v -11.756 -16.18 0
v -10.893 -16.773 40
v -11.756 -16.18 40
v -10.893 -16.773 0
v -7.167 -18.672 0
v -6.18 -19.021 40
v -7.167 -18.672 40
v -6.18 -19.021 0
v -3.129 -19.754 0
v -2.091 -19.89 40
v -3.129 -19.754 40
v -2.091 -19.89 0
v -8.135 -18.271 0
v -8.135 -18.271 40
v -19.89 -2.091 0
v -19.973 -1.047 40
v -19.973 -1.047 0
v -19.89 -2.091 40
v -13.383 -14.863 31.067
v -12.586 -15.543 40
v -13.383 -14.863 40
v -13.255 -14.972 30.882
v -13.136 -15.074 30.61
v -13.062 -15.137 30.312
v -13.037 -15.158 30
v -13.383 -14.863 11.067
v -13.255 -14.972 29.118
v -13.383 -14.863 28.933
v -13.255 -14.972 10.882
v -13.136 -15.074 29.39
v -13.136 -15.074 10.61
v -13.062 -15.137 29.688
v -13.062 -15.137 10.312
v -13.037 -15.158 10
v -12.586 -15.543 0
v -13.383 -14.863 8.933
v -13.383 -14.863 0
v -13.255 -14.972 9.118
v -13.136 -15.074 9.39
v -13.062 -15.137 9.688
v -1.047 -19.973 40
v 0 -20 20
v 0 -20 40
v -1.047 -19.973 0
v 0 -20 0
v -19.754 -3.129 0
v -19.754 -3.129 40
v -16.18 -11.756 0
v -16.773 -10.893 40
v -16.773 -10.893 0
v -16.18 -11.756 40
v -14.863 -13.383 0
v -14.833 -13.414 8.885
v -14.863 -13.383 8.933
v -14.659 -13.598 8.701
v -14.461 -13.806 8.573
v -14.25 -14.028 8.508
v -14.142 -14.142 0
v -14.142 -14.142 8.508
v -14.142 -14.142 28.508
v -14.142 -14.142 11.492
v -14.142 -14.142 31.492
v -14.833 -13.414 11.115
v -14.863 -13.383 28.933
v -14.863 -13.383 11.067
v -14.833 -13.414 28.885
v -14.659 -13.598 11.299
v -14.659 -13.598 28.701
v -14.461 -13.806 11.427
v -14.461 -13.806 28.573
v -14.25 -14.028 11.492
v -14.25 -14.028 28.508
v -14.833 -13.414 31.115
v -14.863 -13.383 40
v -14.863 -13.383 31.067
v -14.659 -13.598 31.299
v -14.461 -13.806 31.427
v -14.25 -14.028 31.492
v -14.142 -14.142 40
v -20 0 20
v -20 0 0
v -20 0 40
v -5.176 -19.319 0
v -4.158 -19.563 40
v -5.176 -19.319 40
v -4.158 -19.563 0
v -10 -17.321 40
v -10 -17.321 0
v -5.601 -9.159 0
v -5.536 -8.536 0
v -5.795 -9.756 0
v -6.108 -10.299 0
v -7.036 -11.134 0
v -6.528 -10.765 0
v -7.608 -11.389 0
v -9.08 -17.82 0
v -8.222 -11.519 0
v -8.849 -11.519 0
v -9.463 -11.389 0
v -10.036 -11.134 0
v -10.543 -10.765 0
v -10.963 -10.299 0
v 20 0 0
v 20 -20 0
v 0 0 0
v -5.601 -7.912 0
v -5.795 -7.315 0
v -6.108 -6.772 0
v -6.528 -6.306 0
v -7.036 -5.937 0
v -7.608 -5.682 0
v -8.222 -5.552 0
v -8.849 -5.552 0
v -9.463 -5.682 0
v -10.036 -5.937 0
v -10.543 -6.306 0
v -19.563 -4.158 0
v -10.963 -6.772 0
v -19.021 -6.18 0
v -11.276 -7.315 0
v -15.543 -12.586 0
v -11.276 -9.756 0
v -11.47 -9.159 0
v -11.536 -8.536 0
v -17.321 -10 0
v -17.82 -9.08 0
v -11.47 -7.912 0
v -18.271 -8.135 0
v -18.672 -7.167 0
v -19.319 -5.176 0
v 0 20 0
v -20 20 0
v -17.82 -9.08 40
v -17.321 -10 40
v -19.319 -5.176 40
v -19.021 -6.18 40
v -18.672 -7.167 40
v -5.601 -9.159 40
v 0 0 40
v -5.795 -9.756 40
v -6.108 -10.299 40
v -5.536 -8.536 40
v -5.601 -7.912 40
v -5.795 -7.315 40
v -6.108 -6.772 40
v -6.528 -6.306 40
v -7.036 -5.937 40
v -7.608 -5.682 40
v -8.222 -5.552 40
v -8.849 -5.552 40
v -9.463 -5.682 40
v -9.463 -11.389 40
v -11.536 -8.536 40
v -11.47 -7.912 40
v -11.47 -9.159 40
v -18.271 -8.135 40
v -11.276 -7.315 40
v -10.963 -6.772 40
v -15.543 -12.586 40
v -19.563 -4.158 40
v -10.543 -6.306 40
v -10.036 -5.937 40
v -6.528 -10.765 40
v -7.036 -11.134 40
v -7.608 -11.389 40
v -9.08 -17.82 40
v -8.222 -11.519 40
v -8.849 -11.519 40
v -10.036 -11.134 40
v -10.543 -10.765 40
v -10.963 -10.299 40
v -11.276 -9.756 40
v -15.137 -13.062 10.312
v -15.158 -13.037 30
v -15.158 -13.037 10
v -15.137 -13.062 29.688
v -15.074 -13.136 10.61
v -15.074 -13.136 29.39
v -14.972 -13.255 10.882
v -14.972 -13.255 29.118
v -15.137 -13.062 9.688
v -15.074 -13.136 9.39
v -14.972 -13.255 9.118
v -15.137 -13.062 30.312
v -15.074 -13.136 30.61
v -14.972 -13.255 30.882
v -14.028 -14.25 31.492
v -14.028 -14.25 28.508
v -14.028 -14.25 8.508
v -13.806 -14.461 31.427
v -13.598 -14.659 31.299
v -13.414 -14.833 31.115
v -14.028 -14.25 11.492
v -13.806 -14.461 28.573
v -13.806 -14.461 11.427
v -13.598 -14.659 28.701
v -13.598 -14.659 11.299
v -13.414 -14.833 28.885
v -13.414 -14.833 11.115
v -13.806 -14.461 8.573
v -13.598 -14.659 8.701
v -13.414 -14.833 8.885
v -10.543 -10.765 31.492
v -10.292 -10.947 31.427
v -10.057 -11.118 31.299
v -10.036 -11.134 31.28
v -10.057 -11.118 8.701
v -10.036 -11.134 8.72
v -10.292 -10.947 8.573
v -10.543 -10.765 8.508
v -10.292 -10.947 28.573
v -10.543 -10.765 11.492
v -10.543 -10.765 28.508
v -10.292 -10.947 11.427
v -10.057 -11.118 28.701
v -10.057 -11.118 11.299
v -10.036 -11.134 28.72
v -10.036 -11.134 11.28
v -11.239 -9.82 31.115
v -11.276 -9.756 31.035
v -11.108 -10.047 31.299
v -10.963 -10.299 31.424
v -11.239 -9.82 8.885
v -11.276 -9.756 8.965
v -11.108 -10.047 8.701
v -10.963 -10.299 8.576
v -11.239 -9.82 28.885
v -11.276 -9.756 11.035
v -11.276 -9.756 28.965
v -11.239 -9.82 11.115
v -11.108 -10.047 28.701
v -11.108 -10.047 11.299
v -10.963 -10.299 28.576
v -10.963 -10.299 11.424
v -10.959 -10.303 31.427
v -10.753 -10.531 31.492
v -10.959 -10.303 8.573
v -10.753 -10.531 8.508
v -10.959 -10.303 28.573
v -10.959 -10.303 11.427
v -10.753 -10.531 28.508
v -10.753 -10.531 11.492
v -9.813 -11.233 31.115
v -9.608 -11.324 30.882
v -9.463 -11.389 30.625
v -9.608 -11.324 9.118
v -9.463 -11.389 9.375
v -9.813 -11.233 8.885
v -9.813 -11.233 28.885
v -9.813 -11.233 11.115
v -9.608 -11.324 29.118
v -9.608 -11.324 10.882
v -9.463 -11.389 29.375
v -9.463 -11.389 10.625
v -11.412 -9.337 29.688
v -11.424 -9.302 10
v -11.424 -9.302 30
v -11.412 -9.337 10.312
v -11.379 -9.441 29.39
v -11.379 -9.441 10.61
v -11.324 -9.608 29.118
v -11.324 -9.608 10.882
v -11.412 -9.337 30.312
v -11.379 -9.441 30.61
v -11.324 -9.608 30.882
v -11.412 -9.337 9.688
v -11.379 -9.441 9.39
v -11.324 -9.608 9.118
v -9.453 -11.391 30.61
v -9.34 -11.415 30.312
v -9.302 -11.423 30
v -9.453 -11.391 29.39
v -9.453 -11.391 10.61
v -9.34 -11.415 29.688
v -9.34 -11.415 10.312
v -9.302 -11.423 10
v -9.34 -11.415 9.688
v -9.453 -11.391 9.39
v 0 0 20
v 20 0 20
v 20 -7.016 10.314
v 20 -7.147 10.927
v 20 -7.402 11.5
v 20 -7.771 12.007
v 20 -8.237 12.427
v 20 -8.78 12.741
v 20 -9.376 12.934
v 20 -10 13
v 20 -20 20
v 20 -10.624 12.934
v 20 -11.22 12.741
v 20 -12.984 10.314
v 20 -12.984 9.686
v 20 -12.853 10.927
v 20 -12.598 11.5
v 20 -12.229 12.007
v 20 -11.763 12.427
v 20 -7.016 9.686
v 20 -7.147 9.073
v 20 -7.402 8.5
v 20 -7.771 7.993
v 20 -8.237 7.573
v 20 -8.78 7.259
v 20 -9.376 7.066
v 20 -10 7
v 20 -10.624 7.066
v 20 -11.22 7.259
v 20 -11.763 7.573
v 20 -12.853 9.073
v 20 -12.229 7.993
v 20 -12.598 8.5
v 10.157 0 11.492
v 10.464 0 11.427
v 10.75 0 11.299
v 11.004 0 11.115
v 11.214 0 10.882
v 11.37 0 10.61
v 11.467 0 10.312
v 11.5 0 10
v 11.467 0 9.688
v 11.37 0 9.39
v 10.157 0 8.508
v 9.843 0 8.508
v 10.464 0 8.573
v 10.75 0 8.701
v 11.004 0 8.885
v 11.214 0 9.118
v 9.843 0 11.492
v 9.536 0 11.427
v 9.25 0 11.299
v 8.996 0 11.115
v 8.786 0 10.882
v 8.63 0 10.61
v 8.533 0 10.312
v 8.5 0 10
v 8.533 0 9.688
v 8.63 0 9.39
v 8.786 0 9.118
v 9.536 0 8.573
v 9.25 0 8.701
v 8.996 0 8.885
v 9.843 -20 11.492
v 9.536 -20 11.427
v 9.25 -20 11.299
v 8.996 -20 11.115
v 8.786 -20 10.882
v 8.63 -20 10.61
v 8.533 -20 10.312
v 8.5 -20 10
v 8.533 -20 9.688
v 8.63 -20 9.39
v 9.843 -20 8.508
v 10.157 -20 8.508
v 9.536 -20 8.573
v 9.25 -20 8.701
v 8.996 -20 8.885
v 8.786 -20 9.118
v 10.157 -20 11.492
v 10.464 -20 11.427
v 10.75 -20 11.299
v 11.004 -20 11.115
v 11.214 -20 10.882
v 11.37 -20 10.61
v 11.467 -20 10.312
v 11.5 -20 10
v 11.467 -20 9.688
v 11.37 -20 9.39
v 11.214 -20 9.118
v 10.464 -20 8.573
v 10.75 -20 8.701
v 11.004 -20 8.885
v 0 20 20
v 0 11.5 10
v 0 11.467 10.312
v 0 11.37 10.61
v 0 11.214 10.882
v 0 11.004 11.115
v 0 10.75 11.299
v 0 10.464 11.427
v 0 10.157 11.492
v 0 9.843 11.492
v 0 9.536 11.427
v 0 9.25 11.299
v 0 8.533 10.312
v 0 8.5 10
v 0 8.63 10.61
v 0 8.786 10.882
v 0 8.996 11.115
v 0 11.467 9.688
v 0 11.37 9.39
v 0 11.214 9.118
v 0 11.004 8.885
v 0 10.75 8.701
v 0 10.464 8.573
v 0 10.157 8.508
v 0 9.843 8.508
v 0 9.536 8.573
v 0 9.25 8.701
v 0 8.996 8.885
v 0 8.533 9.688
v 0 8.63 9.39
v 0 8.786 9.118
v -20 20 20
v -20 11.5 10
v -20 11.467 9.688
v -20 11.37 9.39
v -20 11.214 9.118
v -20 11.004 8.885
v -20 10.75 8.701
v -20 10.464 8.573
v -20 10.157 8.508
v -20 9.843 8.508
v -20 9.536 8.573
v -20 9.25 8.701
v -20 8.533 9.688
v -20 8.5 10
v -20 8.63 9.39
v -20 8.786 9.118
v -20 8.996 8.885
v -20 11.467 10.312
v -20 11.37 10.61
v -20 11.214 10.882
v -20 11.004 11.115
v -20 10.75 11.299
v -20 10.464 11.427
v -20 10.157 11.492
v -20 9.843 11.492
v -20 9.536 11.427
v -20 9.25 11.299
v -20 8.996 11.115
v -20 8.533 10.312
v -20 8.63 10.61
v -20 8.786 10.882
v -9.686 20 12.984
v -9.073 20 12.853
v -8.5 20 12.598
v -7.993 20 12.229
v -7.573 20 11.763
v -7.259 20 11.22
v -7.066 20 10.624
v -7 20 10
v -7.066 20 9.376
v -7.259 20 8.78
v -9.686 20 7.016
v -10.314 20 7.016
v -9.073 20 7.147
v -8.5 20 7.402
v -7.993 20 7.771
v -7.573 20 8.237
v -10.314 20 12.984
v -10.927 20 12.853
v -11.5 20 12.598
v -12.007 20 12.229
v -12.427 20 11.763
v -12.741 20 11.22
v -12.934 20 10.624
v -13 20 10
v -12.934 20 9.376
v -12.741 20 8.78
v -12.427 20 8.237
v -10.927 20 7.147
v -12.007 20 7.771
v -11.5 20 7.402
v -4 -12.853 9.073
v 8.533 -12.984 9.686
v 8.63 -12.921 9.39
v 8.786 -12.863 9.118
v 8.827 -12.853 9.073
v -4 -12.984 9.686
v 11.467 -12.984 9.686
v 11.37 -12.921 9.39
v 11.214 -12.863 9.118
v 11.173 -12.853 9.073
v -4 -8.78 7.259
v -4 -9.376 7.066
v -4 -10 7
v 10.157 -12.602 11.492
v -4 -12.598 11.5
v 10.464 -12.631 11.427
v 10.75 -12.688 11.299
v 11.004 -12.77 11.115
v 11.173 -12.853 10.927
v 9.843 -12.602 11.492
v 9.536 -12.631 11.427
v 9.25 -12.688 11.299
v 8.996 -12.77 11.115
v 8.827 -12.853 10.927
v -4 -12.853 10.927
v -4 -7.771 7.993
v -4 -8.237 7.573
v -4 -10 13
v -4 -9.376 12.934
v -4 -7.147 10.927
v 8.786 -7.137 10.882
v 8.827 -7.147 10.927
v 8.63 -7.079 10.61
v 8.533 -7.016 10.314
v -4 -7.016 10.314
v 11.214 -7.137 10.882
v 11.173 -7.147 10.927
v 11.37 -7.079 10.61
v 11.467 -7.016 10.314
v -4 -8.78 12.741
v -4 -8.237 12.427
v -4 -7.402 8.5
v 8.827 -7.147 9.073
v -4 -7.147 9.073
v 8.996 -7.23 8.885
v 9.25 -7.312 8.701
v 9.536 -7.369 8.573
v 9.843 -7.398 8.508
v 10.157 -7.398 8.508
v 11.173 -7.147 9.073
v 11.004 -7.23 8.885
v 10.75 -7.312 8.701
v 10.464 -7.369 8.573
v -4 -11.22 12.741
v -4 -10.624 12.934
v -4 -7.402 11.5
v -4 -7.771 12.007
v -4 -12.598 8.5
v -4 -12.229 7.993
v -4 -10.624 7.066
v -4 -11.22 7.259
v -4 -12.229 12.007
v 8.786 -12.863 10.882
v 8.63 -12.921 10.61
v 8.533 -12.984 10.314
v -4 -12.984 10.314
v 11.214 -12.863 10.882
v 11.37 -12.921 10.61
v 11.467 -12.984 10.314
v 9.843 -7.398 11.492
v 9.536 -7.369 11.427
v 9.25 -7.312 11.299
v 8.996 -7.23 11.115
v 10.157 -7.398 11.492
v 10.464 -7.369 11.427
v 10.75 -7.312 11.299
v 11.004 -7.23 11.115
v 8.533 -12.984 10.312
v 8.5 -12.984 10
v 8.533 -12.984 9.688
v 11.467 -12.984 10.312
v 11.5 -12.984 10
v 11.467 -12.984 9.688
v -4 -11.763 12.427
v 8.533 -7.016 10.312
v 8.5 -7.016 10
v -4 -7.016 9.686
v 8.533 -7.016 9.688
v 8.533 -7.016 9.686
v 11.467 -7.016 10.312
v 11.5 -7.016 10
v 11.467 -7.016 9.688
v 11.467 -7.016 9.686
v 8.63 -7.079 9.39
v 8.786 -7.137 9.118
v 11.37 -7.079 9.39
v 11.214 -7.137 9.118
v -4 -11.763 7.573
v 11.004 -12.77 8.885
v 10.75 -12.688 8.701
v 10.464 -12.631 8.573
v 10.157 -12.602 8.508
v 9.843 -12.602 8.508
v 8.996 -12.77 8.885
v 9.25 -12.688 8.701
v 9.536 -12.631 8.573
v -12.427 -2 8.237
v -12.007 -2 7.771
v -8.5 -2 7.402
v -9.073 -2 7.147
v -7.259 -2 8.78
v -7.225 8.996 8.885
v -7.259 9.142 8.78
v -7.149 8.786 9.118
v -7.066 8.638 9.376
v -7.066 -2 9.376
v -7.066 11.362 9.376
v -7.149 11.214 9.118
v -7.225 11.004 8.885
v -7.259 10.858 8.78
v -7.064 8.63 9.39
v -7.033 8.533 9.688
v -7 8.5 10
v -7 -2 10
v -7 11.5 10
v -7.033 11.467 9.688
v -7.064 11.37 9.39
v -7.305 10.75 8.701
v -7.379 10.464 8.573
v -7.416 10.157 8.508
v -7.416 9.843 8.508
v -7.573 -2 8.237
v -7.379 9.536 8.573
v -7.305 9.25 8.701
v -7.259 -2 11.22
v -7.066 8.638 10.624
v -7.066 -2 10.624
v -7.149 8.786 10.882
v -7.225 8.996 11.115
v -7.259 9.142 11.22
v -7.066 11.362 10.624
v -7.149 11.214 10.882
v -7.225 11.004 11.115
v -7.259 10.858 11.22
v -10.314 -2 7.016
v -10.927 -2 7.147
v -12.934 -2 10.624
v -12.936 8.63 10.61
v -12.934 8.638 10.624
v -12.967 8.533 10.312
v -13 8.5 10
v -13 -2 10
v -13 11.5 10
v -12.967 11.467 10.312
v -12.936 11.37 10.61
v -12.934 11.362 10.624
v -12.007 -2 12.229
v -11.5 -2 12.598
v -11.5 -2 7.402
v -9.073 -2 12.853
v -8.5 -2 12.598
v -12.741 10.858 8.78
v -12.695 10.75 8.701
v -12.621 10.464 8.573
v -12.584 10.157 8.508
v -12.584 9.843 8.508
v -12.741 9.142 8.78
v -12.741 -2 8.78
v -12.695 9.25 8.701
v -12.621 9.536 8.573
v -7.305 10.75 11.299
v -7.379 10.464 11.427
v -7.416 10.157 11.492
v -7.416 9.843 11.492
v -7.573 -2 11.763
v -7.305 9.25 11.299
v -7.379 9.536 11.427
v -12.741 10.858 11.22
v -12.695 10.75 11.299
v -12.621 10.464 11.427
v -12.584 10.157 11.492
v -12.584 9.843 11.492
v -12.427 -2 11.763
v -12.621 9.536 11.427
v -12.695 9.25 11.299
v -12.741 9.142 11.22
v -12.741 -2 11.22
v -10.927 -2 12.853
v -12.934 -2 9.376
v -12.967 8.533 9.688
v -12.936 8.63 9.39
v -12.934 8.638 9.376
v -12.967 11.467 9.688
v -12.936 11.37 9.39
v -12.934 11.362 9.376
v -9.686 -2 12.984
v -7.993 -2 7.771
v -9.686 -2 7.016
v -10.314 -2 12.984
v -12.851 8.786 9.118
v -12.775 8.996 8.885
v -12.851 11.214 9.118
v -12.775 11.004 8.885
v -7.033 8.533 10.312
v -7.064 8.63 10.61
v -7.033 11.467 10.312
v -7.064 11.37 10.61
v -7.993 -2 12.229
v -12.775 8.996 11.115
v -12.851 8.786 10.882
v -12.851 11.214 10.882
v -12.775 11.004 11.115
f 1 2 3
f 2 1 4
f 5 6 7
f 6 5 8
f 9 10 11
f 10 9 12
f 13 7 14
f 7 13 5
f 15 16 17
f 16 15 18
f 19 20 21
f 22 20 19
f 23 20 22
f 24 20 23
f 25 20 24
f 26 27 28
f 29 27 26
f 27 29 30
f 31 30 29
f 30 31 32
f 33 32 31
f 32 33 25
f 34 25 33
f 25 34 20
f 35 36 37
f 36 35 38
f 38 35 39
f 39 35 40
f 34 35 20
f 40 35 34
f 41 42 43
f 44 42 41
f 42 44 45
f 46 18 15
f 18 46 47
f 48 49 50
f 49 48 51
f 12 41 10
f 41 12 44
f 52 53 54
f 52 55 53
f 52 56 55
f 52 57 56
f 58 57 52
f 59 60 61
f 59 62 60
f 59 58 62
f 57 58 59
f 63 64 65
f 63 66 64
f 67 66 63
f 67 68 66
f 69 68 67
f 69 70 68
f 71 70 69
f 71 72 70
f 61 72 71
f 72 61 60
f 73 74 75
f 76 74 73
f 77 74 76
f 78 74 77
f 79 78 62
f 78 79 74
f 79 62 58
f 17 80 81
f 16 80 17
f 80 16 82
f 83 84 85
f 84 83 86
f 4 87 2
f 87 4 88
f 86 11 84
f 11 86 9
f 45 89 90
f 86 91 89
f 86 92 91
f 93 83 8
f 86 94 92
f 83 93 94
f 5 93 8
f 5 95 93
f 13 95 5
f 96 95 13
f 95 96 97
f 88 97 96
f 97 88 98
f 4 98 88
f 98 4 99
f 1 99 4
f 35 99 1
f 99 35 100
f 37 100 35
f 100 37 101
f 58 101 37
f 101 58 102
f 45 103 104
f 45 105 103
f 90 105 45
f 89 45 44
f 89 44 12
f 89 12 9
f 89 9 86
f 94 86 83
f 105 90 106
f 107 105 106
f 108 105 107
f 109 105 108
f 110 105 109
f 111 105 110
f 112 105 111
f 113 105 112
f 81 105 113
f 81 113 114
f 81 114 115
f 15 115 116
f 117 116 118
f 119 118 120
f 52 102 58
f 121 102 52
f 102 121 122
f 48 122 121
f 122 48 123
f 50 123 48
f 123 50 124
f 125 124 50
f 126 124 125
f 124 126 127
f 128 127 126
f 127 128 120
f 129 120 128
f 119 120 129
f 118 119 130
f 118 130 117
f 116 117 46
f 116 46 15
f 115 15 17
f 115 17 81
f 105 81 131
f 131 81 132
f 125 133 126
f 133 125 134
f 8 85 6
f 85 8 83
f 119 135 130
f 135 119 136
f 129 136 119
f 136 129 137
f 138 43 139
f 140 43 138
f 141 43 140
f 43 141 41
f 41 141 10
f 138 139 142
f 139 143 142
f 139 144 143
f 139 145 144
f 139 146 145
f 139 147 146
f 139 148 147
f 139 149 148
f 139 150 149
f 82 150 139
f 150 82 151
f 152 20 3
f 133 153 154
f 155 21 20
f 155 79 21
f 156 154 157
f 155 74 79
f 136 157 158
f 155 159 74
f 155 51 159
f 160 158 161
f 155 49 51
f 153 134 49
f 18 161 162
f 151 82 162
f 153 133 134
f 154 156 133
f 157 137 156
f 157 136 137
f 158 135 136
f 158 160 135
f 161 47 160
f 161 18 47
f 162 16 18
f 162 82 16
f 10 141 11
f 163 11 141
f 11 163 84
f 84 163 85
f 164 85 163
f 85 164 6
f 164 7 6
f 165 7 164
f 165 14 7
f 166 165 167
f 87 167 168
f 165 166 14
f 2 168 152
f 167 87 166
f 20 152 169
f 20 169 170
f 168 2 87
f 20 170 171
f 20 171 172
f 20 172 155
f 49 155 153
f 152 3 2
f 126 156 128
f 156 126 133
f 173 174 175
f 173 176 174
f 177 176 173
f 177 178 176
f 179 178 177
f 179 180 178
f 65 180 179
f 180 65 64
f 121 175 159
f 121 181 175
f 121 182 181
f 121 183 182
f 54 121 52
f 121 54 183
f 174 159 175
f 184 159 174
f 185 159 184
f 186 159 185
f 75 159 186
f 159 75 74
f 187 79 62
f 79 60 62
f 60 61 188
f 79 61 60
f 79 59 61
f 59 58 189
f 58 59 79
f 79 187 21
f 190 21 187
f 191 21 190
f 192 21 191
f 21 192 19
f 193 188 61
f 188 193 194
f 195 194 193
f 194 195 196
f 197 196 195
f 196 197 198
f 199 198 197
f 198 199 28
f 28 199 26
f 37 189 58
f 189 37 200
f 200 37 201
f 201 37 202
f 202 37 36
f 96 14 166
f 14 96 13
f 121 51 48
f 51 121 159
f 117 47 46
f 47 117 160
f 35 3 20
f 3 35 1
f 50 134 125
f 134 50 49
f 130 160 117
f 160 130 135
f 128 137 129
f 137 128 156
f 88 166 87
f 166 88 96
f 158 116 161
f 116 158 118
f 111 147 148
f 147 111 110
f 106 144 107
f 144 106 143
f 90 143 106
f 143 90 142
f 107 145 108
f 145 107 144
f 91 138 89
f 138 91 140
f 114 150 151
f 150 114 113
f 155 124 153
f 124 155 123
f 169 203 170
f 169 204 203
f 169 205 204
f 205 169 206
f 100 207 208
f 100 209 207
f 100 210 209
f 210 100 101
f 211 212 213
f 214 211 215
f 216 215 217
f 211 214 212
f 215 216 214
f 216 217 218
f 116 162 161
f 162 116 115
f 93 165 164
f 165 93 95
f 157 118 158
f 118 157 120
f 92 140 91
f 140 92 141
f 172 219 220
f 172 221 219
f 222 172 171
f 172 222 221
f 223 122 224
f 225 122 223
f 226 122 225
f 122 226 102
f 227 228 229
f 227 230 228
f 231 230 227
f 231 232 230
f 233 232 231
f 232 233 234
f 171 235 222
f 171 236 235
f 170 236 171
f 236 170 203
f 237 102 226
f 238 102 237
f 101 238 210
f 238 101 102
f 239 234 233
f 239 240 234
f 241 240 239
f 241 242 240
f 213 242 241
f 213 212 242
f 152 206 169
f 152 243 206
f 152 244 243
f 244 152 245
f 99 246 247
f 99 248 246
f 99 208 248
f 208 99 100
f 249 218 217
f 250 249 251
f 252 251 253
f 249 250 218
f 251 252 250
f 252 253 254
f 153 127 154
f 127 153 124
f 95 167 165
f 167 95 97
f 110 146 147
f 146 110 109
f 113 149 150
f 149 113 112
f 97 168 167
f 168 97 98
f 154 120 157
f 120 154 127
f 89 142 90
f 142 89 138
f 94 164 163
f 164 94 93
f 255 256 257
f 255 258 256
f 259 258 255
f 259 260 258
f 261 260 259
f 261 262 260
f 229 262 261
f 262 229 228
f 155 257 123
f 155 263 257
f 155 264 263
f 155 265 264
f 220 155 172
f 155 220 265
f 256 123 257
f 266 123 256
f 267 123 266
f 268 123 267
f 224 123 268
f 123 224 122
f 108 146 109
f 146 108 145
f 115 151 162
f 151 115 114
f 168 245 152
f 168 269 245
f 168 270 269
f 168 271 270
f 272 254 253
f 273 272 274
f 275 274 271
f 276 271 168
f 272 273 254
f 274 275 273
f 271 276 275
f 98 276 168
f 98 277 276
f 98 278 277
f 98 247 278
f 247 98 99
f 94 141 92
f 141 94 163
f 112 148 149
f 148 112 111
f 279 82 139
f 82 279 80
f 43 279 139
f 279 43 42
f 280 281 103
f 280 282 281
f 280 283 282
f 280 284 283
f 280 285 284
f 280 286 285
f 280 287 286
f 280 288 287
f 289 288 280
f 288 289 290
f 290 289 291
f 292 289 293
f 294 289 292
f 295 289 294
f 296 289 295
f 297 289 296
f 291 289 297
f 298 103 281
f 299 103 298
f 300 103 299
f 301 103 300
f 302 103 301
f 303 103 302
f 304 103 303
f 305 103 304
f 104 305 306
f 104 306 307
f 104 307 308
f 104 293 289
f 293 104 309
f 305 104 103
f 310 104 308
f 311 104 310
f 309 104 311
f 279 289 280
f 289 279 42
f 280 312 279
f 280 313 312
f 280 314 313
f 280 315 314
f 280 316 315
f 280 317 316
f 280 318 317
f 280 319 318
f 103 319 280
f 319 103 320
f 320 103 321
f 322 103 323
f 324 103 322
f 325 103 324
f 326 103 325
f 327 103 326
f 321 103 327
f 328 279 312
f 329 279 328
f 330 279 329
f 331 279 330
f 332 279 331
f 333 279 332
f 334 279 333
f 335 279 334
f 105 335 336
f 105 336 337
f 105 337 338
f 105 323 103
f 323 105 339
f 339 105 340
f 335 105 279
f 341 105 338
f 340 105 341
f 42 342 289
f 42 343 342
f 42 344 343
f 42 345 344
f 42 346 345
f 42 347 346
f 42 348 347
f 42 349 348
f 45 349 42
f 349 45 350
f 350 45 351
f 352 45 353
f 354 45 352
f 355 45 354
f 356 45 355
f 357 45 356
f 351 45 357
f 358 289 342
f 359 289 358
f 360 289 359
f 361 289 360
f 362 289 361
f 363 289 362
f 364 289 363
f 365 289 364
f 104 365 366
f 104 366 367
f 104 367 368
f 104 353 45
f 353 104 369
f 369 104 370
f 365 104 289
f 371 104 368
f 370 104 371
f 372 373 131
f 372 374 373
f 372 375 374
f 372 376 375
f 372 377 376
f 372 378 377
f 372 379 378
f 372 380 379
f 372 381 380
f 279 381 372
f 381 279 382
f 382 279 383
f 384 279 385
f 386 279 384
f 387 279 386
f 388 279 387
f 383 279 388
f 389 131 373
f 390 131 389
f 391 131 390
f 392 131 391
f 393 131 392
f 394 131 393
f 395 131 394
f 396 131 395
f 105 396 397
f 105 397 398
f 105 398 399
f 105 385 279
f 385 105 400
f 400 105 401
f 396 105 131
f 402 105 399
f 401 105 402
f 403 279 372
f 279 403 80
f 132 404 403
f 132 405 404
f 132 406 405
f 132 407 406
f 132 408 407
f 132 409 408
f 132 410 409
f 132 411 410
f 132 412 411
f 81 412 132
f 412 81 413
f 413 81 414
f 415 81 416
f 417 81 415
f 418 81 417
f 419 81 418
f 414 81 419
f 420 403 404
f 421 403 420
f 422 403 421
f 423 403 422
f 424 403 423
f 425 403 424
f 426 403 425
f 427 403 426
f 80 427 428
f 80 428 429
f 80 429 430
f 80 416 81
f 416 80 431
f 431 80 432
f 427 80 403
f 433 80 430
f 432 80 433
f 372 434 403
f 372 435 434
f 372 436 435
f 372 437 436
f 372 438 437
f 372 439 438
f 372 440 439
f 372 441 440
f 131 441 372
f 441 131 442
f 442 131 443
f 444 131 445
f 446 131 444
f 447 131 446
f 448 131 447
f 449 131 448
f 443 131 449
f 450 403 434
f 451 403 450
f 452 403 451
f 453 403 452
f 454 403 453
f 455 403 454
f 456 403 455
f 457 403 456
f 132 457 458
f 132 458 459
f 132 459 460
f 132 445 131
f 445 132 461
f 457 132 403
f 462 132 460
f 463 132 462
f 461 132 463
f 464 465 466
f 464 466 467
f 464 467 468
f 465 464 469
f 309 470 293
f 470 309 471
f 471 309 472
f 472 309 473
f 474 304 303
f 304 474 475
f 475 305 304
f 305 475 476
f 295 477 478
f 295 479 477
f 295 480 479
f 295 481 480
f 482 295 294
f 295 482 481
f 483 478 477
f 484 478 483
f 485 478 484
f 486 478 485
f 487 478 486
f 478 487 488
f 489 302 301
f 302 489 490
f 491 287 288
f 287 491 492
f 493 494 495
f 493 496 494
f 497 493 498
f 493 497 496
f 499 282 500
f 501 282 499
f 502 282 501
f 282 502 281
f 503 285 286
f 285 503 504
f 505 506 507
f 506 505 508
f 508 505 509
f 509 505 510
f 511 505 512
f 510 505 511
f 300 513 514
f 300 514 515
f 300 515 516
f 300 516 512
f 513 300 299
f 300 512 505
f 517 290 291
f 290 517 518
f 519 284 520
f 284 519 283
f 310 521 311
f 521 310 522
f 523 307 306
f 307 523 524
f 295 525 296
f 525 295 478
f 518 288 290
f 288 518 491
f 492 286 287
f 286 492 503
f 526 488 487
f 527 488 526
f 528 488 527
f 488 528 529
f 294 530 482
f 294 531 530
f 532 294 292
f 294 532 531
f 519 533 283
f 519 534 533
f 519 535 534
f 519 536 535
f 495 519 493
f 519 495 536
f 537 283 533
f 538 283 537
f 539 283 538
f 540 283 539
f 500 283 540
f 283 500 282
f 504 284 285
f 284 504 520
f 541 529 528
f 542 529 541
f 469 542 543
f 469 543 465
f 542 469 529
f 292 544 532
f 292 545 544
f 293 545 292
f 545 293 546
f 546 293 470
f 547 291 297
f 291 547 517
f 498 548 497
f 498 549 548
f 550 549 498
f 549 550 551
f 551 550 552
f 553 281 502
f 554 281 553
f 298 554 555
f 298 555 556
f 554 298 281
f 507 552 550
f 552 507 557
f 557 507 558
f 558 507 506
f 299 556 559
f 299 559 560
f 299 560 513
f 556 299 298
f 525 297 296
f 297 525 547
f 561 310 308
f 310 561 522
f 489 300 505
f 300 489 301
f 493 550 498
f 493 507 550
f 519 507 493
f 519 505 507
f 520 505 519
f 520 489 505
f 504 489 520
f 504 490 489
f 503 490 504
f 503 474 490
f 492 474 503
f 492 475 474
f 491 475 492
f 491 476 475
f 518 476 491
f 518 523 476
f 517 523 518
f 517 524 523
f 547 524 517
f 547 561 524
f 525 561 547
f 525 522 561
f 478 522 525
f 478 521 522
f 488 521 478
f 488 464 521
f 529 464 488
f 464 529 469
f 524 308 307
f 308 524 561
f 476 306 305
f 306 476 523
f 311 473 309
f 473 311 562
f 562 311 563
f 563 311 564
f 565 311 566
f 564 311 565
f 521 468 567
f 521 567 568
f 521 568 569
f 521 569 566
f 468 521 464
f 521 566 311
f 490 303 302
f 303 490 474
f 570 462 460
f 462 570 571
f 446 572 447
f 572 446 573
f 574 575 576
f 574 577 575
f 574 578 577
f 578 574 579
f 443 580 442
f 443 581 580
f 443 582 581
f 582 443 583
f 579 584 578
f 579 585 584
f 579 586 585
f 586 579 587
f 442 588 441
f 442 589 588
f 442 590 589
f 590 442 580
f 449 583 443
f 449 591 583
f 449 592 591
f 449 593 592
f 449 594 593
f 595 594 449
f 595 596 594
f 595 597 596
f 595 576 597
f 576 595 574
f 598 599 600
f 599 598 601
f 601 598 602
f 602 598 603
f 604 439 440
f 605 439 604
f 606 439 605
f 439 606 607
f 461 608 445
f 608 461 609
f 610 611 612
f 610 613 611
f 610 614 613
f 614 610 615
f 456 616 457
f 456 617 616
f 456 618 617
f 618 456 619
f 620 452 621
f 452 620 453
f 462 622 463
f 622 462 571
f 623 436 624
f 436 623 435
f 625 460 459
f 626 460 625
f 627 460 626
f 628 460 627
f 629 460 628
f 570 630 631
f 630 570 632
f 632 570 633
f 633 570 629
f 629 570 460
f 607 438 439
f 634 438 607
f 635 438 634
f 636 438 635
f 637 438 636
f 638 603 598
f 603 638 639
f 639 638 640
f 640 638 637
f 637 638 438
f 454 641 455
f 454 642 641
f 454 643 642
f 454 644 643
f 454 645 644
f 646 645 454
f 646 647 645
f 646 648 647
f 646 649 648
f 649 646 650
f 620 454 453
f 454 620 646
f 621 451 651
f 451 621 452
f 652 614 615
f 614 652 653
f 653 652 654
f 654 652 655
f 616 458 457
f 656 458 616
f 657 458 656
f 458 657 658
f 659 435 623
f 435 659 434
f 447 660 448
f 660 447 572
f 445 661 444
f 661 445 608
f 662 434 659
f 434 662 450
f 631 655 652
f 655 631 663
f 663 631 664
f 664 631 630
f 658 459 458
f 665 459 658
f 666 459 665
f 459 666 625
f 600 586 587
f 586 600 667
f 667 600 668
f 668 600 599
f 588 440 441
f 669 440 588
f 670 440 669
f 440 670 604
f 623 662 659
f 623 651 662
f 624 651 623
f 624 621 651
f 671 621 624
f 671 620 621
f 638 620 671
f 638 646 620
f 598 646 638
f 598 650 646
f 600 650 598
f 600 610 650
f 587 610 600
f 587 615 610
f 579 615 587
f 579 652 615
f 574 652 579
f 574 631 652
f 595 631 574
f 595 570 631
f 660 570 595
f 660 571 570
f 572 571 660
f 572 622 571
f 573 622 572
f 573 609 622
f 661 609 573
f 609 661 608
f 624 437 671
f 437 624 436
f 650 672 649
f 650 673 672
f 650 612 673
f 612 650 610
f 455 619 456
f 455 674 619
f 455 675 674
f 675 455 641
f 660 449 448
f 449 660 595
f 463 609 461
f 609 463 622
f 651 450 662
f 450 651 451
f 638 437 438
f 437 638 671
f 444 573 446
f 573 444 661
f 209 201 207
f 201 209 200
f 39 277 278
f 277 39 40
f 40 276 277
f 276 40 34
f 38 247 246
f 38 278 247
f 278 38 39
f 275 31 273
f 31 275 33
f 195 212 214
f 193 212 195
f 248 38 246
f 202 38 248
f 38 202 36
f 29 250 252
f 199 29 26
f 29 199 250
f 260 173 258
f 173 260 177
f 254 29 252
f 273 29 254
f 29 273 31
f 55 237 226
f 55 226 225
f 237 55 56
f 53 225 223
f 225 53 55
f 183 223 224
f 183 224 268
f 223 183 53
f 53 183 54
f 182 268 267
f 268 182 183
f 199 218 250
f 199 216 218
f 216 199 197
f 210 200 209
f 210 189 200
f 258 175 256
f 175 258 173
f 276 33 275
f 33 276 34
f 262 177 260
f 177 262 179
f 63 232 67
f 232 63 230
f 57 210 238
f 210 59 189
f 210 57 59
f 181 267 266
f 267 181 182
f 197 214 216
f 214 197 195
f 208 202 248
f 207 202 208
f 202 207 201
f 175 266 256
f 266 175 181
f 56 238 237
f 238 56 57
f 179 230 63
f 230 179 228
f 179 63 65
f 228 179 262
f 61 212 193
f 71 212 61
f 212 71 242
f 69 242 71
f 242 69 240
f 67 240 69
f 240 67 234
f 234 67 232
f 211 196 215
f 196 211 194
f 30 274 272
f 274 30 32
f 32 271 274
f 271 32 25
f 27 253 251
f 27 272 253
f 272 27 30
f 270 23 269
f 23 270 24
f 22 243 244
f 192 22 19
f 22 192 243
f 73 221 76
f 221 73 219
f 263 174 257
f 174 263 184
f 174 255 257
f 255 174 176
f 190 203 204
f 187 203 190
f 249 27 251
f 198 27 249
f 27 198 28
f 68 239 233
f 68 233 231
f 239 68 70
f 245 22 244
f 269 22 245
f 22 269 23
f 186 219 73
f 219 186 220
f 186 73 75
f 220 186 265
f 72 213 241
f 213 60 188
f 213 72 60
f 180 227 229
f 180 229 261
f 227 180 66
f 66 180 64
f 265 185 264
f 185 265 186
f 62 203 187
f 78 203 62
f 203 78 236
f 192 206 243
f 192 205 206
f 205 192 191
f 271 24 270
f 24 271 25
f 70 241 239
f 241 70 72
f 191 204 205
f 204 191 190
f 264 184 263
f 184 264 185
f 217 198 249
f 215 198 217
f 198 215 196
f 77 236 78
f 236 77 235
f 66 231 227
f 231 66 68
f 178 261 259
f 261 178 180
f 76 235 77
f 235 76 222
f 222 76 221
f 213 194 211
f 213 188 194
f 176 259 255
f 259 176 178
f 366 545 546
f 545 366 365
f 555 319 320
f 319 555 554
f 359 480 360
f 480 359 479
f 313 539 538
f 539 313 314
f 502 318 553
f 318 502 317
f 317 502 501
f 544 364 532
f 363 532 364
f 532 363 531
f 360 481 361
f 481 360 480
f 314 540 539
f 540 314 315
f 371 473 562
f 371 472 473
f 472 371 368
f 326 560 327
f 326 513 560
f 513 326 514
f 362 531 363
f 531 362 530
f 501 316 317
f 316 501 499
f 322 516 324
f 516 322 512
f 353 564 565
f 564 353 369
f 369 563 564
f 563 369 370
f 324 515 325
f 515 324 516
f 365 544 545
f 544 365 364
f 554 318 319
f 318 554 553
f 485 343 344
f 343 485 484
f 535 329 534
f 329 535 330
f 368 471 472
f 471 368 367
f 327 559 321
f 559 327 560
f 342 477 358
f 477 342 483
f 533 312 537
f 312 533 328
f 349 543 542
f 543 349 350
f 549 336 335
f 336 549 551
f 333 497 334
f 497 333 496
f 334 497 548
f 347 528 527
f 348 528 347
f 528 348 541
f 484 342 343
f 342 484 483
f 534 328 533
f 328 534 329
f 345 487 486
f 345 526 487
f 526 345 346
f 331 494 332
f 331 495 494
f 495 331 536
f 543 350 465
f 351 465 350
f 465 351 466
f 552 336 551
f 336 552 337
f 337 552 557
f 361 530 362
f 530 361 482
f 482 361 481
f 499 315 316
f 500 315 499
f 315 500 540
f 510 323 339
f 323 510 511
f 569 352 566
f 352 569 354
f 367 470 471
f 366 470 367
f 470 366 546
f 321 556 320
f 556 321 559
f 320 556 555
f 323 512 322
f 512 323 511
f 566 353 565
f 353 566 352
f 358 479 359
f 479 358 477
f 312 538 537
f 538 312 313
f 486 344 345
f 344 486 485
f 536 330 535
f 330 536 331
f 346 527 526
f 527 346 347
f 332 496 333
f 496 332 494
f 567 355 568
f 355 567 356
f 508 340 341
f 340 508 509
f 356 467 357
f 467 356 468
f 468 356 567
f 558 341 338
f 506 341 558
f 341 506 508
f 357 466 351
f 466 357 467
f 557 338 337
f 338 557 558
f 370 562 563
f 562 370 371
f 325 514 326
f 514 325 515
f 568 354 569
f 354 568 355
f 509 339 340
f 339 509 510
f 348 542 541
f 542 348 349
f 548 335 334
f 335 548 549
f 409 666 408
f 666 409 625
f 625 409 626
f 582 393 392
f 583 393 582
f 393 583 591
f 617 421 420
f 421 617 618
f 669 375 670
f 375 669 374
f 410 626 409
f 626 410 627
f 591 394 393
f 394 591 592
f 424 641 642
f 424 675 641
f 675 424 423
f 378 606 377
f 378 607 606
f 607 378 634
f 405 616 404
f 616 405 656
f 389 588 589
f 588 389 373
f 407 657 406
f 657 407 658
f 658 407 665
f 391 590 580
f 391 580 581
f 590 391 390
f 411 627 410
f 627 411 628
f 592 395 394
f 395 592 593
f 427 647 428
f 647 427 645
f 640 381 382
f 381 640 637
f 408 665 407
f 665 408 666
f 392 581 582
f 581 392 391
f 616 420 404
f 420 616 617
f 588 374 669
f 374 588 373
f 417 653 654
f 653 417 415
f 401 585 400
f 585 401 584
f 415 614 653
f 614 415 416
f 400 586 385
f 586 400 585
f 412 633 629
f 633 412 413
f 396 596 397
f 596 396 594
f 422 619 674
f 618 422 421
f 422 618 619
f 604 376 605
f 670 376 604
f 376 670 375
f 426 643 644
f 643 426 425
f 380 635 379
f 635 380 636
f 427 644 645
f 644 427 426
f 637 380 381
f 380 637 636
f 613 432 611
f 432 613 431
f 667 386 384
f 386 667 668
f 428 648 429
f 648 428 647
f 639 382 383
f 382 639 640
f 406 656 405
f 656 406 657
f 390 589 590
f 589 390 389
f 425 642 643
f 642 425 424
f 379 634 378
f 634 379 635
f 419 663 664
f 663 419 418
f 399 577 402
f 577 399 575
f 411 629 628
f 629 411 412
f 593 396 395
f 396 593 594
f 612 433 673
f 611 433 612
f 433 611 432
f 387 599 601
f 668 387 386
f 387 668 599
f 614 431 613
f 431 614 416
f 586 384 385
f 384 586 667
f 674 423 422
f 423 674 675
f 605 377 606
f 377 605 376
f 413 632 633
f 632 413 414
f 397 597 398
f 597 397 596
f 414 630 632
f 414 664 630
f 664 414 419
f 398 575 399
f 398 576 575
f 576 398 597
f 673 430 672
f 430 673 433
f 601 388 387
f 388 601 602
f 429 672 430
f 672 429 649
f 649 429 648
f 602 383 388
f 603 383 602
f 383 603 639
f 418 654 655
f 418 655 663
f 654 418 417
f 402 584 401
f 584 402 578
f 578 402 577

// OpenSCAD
module frameT1Joint() {
    radius = 20;
    height = 20;
    roleRadius = 3;
    fixingRoleRadius = 3.0 / 2;
    
    difference() {
        
        //main vertical structure
        union(){
            difference() {
                cylinder(r = radius, h = 2*height, $fn=120);
                   
                verticalRolePosition = -(2 + sqrt(2))/8*radius;
                translate([verticalRolePosition, verticalRolePosition, -1])
                    cylinder(r = roleRadius, h = 2*height + 2, $fn=30);
                translate([0, 0, -1])
                    cube([radius + 1, radius + 1, 2*height + 2]); 
                translate([-radius, 0, -1])
                    cube([radius + 1, radius + 1, 2*height + 2]);
                translate([0, -radius, -1])
                    cube([radius + 1, radius + 1, 2*height + 2]);
            }
            translate([0, -radius, 0])
                cube([radius, radius, height]);  
            translate([-radius, 0, 0])
                cube([radius, radius, height]);   
        } 
        
        //side cubes roles
        {
            translate([2*height - 2, -radius/2, height/2])
                rotate(a=[0, -90, 0])
                    cylinder(r = roleRadius, h = 2*height + 2, $fn=30);
            translate([-radius/2, -2, height/2])
                rotate(a=[-90, 0, 0])
                    cylinder(r = roleRadius, h = 2*height + 2, $fn=30); 
        }
        
        //fixing roles
        {
            translate([-sqrt(2)*height/2, -sqrt(2)*radius/2, height/2])
                    rotate(a=[-90, 0, -45])
                        cylinder(r = fixingRoleRadius, h = height/2, $fn=30);
            translate([-sqrt(2)*height/2, -sqrt(2)*radius/2, 3 *height/2])
                    rotate(a=[-90, 0, -45])
                        cylinder(r = fixingRoleRadius, h = height/2, $fn=30);
            
            translate([height/2, 1, height/2])
                    rotate(a=[90, 0, 0])
                        cylinder(r = fixingRoleRadius, h = height + 2, $fn=30);
            
            translate([-height - 1, height/2, height/2])
                    rotate(a=[90, 0, 90])
                        cylinder(r = fixingRoleRadius, h = height + 2, $fn=30);
            
        }

    }
            
    
}

frameT1Joint();
